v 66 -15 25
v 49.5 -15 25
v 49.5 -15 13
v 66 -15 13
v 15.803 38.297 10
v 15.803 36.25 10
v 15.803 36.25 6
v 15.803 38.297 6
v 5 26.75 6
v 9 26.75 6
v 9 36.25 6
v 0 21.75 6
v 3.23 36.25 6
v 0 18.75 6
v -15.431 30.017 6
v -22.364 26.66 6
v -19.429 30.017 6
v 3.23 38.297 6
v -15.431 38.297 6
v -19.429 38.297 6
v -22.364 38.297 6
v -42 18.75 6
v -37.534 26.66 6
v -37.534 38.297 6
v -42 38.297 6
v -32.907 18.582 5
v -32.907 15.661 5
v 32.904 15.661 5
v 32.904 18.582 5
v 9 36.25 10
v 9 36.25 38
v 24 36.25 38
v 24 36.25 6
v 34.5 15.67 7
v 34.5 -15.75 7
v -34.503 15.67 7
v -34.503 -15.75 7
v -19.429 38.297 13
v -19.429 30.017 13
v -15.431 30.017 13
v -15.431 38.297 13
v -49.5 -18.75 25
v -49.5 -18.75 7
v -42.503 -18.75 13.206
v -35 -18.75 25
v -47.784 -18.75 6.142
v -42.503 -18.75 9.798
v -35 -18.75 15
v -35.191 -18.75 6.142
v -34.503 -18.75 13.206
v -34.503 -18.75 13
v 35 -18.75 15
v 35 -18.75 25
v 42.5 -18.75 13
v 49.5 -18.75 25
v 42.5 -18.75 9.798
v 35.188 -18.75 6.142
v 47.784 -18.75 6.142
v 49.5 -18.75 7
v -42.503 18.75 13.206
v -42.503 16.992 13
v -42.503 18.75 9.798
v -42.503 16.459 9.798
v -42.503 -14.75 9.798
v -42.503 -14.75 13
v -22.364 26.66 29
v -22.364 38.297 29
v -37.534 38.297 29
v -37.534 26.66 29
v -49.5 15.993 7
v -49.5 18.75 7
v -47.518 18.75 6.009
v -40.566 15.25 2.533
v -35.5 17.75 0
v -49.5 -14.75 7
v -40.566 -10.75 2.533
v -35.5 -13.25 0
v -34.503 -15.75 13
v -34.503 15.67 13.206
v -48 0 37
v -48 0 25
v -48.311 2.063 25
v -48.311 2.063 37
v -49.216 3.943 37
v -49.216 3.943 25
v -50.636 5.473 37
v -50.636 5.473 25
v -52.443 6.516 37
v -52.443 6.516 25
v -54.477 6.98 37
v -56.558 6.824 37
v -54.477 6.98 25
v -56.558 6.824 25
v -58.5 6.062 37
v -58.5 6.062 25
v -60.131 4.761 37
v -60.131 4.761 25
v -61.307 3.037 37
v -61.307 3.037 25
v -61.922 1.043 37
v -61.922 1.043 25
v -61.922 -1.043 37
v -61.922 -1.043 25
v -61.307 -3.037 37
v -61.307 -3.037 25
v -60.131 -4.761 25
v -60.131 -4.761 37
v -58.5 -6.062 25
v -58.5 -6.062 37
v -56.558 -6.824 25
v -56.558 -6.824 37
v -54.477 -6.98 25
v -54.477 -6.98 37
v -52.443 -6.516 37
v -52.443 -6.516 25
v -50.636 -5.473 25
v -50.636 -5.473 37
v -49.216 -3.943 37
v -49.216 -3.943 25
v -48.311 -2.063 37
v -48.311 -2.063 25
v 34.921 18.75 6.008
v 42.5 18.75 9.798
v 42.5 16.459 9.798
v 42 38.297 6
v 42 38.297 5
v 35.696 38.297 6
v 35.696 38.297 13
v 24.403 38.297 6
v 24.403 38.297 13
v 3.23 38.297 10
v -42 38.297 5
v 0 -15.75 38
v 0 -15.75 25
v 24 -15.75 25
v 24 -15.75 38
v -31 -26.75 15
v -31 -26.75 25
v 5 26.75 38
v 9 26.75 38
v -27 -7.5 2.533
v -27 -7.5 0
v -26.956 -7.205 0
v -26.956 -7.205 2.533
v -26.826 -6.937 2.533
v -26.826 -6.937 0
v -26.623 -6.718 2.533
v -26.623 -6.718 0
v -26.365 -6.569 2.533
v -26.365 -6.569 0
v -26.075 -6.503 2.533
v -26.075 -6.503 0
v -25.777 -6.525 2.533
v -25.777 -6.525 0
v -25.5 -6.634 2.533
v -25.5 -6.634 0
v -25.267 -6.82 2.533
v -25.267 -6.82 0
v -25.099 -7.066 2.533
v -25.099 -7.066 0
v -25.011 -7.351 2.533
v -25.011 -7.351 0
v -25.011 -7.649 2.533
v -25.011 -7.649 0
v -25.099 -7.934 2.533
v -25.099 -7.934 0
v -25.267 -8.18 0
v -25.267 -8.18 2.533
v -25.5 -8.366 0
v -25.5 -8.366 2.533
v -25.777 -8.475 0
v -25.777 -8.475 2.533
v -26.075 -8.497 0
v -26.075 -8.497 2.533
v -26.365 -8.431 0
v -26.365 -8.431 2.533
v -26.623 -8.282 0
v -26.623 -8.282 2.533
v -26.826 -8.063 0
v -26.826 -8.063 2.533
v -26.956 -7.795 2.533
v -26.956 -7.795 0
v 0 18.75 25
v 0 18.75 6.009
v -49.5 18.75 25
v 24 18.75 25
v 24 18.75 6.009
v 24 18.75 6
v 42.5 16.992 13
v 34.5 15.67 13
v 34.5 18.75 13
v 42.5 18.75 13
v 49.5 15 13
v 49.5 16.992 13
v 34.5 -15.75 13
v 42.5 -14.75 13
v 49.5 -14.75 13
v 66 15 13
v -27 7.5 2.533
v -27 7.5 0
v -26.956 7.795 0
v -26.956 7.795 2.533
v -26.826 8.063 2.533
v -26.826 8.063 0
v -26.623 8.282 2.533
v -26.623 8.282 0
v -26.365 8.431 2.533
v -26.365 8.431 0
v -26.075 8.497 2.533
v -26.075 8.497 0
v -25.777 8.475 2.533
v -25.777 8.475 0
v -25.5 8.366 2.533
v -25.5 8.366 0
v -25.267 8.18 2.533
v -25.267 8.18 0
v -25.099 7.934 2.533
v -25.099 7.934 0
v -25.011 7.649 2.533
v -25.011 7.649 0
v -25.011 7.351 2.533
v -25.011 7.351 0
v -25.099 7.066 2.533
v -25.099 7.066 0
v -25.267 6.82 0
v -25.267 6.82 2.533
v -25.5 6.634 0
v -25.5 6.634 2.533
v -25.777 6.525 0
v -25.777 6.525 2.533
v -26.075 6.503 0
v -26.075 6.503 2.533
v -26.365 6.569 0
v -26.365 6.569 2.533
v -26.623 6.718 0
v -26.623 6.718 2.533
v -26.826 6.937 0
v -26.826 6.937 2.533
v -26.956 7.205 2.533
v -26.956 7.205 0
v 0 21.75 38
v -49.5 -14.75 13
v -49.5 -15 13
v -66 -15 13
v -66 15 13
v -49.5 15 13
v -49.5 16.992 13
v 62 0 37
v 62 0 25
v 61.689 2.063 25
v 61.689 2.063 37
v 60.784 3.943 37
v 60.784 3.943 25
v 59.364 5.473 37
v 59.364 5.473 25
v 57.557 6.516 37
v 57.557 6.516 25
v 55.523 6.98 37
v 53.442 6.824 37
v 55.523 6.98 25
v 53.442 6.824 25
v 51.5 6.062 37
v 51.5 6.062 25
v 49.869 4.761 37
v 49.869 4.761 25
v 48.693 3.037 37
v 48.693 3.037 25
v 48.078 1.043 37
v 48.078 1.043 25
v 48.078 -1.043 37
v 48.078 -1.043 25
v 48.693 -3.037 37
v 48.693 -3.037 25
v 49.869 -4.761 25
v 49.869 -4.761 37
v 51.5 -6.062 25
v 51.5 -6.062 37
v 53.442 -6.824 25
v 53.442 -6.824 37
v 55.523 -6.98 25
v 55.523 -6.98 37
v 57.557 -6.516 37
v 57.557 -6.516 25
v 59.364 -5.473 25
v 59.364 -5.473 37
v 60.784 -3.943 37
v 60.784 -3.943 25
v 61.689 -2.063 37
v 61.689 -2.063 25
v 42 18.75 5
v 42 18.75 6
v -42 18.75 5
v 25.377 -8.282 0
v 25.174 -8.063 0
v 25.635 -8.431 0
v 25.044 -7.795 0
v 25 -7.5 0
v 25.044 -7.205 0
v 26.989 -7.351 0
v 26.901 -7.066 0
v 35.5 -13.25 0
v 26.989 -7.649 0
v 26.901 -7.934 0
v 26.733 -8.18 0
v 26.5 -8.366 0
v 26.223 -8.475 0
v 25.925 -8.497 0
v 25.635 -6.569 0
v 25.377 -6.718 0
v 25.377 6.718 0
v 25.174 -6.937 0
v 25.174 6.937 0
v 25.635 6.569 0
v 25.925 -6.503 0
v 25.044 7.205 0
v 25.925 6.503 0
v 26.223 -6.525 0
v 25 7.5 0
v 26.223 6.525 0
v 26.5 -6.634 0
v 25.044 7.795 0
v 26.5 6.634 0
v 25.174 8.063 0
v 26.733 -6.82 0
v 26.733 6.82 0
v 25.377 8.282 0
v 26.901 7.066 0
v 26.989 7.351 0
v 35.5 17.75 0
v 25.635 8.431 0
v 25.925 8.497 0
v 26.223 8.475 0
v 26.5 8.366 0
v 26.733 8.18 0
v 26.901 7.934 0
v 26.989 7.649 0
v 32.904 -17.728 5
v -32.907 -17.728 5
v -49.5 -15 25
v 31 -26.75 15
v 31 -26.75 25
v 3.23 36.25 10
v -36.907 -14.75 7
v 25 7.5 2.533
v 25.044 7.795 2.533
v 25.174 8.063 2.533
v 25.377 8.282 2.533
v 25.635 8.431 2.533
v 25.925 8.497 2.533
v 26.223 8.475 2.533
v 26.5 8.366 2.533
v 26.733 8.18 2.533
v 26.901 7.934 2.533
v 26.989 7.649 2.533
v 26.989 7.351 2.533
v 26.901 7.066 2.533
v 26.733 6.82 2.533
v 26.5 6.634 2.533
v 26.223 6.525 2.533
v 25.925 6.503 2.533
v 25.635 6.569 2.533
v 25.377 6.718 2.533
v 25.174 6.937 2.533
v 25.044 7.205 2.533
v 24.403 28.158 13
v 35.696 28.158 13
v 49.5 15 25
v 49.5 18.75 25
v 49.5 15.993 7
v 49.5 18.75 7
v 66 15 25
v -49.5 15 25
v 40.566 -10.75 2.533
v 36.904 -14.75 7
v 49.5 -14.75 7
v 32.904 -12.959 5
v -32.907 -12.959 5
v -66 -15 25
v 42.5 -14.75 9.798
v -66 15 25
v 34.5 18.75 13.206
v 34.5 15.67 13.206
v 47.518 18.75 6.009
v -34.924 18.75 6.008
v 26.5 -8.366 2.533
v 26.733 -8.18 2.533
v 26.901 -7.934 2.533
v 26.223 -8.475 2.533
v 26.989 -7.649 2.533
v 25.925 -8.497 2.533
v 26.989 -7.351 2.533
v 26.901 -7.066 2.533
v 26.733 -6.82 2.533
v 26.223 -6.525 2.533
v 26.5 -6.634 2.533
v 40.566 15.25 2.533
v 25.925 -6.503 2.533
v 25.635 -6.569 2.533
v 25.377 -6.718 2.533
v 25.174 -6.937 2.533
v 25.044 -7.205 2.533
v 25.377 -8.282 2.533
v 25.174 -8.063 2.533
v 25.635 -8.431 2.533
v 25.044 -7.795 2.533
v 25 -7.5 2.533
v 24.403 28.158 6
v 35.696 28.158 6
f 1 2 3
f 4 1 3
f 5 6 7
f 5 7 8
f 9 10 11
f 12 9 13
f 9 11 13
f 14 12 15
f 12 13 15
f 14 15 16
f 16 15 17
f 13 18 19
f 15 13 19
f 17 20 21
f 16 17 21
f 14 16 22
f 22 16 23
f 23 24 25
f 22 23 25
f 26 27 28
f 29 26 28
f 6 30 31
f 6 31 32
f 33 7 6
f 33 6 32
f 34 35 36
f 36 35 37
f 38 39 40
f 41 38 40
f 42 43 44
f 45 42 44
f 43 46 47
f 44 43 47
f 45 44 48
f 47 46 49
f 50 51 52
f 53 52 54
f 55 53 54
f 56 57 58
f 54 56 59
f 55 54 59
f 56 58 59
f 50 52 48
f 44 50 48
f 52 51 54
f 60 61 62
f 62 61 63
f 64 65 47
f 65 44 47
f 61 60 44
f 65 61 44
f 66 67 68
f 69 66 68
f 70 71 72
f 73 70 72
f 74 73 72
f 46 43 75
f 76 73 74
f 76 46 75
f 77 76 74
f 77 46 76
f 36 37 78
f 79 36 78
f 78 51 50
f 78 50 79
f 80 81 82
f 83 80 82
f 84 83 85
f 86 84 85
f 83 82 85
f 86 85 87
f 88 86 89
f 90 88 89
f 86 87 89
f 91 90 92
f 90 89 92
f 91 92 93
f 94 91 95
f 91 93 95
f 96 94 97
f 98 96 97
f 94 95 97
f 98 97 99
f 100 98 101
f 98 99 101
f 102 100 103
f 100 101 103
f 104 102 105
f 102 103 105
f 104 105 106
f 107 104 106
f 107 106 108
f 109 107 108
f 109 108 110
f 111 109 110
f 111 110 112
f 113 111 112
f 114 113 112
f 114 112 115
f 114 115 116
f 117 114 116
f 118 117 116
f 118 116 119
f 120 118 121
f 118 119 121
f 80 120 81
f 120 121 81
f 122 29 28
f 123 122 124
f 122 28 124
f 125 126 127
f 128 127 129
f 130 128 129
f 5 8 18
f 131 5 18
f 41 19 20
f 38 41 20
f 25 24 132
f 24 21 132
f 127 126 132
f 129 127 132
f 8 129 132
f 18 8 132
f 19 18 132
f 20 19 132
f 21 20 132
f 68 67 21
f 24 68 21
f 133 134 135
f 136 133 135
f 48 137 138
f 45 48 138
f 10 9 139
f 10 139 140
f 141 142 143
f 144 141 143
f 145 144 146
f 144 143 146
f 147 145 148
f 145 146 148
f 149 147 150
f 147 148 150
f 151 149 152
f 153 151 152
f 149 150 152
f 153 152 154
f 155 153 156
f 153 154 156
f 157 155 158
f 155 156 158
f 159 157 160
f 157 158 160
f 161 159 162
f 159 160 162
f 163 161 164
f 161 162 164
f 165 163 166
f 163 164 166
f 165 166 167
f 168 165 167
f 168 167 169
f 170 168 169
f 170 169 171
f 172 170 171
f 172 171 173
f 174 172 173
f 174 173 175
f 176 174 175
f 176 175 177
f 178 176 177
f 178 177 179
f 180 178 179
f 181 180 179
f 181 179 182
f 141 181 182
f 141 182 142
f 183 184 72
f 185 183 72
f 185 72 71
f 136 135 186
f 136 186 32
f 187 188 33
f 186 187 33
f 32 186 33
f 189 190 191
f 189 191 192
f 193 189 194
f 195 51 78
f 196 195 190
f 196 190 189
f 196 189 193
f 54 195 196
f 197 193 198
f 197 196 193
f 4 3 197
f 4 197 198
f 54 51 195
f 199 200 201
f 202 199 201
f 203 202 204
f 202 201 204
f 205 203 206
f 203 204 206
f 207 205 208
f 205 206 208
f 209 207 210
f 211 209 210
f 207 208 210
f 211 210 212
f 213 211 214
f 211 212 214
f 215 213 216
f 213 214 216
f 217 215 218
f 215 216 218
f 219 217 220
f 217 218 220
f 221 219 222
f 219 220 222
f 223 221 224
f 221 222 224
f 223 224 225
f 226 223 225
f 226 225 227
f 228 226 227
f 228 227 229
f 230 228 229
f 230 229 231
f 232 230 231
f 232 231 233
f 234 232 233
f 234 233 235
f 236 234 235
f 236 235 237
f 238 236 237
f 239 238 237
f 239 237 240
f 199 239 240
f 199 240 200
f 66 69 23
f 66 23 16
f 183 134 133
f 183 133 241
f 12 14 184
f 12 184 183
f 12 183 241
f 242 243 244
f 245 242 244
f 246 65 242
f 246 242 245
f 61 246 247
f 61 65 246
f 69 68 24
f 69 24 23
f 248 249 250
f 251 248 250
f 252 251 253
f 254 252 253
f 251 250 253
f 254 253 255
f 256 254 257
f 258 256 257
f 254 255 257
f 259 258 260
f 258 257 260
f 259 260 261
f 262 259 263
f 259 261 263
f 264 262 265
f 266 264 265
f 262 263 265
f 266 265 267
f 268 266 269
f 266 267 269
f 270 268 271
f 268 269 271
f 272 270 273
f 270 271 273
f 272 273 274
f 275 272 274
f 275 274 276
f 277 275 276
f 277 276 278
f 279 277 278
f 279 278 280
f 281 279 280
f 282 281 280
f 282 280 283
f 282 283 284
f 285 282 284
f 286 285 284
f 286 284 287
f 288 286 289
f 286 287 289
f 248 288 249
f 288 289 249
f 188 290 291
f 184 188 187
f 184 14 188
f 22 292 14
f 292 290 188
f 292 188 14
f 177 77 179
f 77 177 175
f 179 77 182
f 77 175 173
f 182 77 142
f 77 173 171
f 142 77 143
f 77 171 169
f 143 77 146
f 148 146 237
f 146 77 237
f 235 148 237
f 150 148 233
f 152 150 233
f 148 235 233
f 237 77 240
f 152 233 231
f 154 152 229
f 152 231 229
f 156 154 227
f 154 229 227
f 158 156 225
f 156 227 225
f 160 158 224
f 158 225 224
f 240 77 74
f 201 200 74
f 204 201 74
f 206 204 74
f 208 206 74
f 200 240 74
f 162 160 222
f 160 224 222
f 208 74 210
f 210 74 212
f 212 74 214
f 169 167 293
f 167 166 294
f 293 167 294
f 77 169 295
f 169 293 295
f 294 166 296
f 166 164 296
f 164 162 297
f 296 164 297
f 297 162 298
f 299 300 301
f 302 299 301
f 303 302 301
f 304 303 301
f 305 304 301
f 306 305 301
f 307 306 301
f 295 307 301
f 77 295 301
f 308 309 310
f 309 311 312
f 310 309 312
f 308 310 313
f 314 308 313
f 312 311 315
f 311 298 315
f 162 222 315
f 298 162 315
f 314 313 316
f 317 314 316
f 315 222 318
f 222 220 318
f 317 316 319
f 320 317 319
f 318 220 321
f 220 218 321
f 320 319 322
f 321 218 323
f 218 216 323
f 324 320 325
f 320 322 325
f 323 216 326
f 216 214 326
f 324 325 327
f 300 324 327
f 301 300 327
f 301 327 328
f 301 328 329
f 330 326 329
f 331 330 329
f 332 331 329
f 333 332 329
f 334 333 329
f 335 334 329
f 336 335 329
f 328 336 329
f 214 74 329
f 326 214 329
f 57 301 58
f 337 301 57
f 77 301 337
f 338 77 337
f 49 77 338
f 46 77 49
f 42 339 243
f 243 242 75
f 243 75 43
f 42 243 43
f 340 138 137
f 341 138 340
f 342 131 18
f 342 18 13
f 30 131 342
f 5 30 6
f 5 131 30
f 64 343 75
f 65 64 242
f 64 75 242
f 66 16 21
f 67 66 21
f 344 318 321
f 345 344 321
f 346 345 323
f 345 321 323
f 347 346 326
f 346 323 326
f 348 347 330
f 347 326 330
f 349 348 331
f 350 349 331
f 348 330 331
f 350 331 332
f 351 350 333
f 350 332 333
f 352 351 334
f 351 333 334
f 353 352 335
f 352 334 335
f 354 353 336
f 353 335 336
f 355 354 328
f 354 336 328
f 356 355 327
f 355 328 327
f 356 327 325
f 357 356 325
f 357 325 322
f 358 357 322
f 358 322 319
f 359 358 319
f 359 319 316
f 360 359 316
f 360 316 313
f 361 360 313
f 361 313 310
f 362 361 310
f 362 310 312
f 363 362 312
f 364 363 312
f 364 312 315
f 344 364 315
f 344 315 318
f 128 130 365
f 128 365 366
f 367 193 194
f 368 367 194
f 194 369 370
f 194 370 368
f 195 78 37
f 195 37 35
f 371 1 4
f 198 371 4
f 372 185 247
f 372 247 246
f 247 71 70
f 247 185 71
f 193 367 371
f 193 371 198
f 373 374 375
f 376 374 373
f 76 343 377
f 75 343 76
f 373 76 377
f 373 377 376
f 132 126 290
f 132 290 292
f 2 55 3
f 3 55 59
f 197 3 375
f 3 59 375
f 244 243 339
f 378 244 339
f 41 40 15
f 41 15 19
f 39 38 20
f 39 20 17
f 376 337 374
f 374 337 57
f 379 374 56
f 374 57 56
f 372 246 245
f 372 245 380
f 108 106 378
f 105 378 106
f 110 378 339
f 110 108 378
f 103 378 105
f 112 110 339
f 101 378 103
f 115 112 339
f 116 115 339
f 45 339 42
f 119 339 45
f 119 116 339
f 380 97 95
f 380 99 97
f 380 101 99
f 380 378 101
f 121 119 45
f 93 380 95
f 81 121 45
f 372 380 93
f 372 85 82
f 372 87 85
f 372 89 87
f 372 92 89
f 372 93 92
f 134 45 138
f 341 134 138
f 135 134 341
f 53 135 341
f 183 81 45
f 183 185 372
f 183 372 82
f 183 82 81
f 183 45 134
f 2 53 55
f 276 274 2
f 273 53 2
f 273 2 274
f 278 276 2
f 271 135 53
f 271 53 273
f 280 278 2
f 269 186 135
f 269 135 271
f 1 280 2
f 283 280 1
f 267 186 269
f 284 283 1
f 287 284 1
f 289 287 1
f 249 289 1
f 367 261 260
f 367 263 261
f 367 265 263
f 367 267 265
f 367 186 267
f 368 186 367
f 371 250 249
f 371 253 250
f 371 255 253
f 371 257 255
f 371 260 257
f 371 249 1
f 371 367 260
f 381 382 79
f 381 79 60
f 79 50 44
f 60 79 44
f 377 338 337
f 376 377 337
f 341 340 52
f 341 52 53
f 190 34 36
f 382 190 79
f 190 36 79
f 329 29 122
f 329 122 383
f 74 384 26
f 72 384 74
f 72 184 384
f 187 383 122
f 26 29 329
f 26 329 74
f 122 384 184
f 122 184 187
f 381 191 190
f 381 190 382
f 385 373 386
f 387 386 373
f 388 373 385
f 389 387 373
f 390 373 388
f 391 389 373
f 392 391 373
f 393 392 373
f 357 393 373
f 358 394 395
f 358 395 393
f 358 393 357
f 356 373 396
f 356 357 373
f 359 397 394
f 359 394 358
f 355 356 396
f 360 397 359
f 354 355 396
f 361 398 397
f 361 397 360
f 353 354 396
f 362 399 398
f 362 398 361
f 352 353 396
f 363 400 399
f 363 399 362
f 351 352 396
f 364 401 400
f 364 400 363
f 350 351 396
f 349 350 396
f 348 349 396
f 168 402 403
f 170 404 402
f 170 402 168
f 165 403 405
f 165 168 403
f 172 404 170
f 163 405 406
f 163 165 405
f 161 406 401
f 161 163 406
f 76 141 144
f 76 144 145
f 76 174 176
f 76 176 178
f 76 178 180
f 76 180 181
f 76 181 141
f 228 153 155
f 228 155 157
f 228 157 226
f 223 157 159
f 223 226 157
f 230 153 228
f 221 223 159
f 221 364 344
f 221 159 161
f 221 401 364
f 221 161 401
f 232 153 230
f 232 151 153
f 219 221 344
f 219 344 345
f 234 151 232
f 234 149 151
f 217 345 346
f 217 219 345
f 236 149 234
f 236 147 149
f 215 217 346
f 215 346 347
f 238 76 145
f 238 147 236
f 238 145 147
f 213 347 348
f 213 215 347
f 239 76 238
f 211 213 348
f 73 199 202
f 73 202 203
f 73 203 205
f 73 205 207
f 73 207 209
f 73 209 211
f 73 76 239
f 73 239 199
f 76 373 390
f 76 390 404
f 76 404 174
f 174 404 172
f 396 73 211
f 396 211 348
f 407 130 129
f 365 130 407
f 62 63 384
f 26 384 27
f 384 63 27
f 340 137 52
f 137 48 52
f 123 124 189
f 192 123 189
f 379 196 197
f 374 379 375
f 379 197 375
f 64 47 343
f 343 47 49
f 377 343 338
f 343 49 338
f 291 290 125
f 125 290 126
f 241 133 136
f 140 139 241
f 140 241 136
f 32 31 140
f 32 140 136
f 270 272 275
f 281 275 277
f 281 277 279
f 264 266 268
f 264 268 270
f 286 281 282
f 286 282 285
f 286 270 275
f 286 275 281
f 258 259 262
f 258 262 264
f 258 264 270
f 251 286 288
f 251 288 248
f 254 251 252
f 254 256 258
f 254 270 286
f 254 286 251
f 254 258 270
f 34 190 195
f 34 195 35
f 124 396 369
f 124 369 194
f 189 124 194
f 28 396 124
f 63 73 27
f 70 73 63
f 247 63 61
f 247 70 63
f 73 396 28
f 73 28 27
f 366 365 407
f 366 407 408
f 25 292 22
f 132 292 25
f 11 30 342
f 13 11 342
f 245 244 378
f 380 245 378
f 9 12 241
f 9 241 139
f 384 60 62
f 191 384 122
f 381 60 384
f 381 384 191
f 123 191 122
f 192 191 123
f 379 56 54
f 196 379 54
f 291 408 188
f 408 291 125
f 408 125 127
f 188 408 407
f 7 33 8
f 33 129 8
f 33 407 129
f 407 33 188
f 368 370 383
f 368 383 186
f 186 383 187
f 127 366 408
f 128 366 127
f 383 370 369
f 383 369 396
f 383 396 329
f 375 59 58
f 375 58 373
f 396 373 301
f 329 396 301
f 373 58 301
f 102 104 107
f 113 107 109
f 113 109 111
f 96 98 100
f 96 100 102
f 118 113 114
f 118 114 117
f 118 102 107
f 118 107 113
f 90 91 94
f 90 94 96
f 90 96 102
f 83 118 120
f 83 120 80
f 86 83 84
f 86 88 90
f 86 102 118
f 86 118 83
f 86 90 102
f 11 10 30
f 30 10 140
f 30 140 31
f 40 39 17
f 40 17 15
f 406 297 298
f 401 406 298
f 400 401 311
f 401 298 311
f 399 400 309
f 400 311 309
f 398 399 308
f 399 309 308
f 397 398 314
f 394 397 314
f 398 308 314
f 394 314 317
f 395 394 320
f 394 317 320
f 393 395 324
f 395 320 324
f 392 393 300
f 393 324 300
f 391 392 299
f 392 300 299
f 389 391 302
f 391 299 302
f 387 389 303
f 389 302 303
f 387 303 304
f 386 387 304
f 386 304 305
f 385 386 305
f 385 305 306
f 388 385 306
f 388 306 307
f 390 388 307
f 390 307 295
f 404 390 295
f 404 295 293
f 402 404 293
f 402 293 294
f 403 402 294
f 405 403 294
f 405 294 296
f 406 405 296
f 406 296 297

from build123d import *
from OCP.BRepFilletAPI import BRepFilletAPI_MakeChamfer

# Parameters (mm, degrees)
BOSS_EXTRUDE1_DEPTH = 25
SKETCH2_W           = 84
SKETCH2_H           = 19.546511152
BOSS_EXTRUDE2_DEPTH = 24
SKETCH3_W           = 12
SKETCH3_H           = 30
BOSS_EXTRUDE3_DEPTH = 16.5
SKETCH4_W           = 12
SKETCH4_H           = 30
BOSS_EXTRUDE4_DEPTH = 16.5
SKETCH5_W           = 24
SKETCH5_H           = 52
BOSS_EXTRUDE5_DEPTH = 13
SKETCH9_W           = 70
SKETCH9_H           = 10
BOSS_EXTRUDE6_DEPTH = 8
CHAMFER1_SIZE       = 8
CHAMFER1_SIZE_2     = 4
SKETCH10_R          = 7
BOSS_EXTRUDE7_DEPTH = 12
SKETCH11_R          = 1
CUT_EXTRUDE1_DEPTH  = 5
CUT_EXTRUDE24_DEPTH = 37.4999
CUT_EXTRUDE25_REACH = 90.714
CUT_EXTRUDE26_DEPTH = 99
CUT_EXTRUDE27_REACH = 129.479
CUT_EXTRUDE28_DEPTH = 69.00303493
CUT_EXTRUDE29_REACH = 129.479
SKETCH19_W          = 69.00303493
SKETCH19_H          = 6
CUT_EXTRUDE30_DEPTH = 3
CUT_EXTRUDE32_DEPTH = 23
SKETCH21_W          = 3.997604332
SKETCH21_H          = 8.279085248
SKETCH21_W_2        = 11.293242608
SKETCH21_H_2        = 10.138766403
CUT_EXTRUDE33_DEPTH = 16
SKETCH22_W          = 12.573143588
SKETCH22_H          = 2.046511152
CUT_EXTRUDE34_DEPTH = 19
CUT_EXTRUDE35_DEPTH = 32


with BuildPart() as part:
    # Sketch1 → Boss-Extrude1 (new body)
    with BuildSketch(Plane.XY):
        Polygon((49.5, 0), (49.5, 18.75), (-49.5, 18.75), (-49.5, -18.75), (49.5, -18.75), align=None)
    extrude(amount=BOSS_EXTRUDE1_DEPTH)

    # Sketch2 → Boss-Extrude2 (add)
    with BuildSketch(Plane(origin=(0, 0, 5), x_dir=(-1, 0, 0), z_dir=(0, 0, -1))):
        with Locations((0, 28.523255576)):
            Rectangle(SKETCH2_W, SKETCH2_H)
    extrude(amount=-BOSS_EXTRUDE2_DEPTH)

    # Sketch3 → Boss-Extrude3 (add)
    with BuildSketch(Plane(origin=(49.5, 0, 0), x_dir=(0, 0, -1), z_dir=(1, 0, 0))):
        with Locations((-19, 0)):
            Rectangle(SKETCH3_W, SKETCH3_H)
    extrude(amount=BOSS_EXTRUDE3_DEPTH)

    # Sketch4 → Boss-Extrude4 (add)
    with BuildSketch(Plane.ZY.offset(49.5)):
        with Locations((19, 0)):
            Rectangle(SKETCH4_W, SKETCH4_H)
    extrude(amount=BOSS_EXTRUDE4_DEPTH)

    # Sketch5 → Boss-Extrude5 (add)
    with BuildSketch(Plane.XY.offset(25)):
        with Locations((12, 10.25)):
            Rectangle(SKETCH5_W, SKETCH5_H)
    extrude(amount=BOSS_EXTRUDE5_DEPTH)

    # Sketch9 → Boss-Extrude6 (add)
    with BuildSketch(Plane.XZ.offset(18.75)):
        with Locations((0, 20)):
            Rectangle(SKETCH9_W, SKETCH9_H)
    extrude(amount=BOSS_EXTRUDE6_DEPTH)

    # Chamfer1
    chamfer1_edges_1 = [part.edges().sort_by_distance(p)[0] for p in [
        (-35, -26.75, 20),
    ]]
    chamfer1_side_1 = [part.faces().sort_by_distance(p)[0] for p in [
        (-35, -26.67, 20),
    ]]
    chamfer1_edges_2 = [part.edges().sort_by_distance(p)[0] for p in [
        (35, -26.75, 20),
    ]]
    chamfer1_side_2 = [part.faces().sort_by_distance(p)[0] for p in [
        (35, -26.67, 20),
    ]]
    chamfer1 = BRepFilletAPI_MakeChamfer(part.part.solid().wrapped)
    for e in chamfer1_edges_1:
        chamfer1.Add(CHAMFER1_SIZE - 0.0001, CHAMFER1_SIZE_2 - 0.0001, e.wrapped, chamfer1_side_1[0].wrapped)
    for e in chamfer1_edges_2:
        chamfer1.Add(CHAMFER1_SIZE - 0.0001, CHAMFER1_SIZE_2 - 0.0001, e.wrapped, chamfer1_side_2[0].wrapped)
    add(Compound.cast(chamfer1.Shape()), mode=Mode.REPLACE)  # a hair under: the kernel refuses the full size

    # Sketch10 → Boss-Extrude7 (add)
    with BuildSketch(Plane.XY.offset(25)):
        with Locations((-55, 0)):
            Circle(SKETCH10_R)
        with Locations((55, 0)):
            Circle(SKETCH10_R)
    extrude(amount=BOSS_EXTRUDE7_DEPTH)

    # Sketch11 → Cut-Extrude1 (cut)
    with BuildSketch(Plane(origin=(0, 0, 0), x_dir=(-1, 0, 0), z_dir=(0, 0, -1))):
        with Locations((-26, 7.5)):
            Circle(SKETCH11_R)
        with Locations((26, 7.5)):
            Circle(SKETCH11_R)
        with Locations((26, -7.5)):
            Circle(SKETCH11_R)
        with Locations((-26, -7.5)):
            Circle(SKETCH11_R)
    extrude(amount=-CUT_EXTRUDE1_DEPTH, mode=Mode.SUBTRACT)

    # Sketch12 → Cut-Extrude24 (cut)
    with BuildSketch(Plane.XZ.offset(18.75)):
        Polygon((49.5, 7), (35.5, 0), (49.5, 0), align=None)
        Polygon((-49.5, 0), (-49.5, 7), (-35.5, 0), align=None)
        Polygon((-42.50303493, 13.206106321), (-42.50303493, 9.79786642), (-32.90730209, 5), (32.904267164, 5), (42.5, 9.797866418), (42.5, 13), (34.5, 13), (34.5, 7), (-34.50303493, 7), (-34.50303493, 13.206106321), align=None)
    extrude(amount=-CUT_EXTRUDE24_DEPTH, mode=Mode.SUBTRACT)

    # Sketch13 → Cut-Extrude25 (cut, up to next)
    with BuildSketch(Plane.XZ.offset(-18.7499), mode=Mode.PRIVATE) as cut_extrude25_sk1:
        Polygon((49.5, 7), (49.5, 0), (35.5, 0), align=None)
    cut_extrude25_tool1 = extrude(cut_extrude25_sk1.sketch, amount=-CUT_EXTRUDE25_REACH, mode=Mode.PRIVATE) & part.part
    # Sketch13 → Cut-Extrude25 (cut, up to next)
    with BuildSketch(Plane.XZ.offset(-18.7499), mode=Mode.PRIVATE) as cut_extrude25_sk2:
        Polygon((-35.5, 0), (-49.5, 0), (-49.5, 7), align=None)
    cut_extrude25_tool2 = extrude(cut_extrude25_sk2.sketch, amount=-CUT_EXTRUDE25_REACH, mode=Mode.PRIVATE) & part.part
    add(cut_extrude25_tool1.solids().sort_by_distance((44.833333, 18.7499, 2.333333))[0], mode=Mode.SUBTRACT)
    add(cut_extrude25_tool2.solids().sort_by_distance((-44.833333, 18.7499, 2.333333))[0], mode=Mode.SUBTRACT)

    # Sketch14 → Cut-Extrude26 (cut)
    with BuildSketch(Plane.ZY.offset(49.5)):
        Polygon((13, 15.669938024), (7, 15.669938024), (7, -14.75), (2.533243234, -10.75), (2.533243234, 15.25), (13, 16.991870924), align=None)
        Polygon((0, 17.75), (0, 18.75), (6.008916401, 18.75), align=None)
        Polygon((0, -13.25), (6.141790553, -18.75), (0, -18.75), align=None)
    extrude(amount=-CUT_EXTRUDE26_DEPTH, mode=Mode.SUBTRACT)

    # Sketch15 → Cut-Extrude27 (cut, up to next)
    with BuildSketch(Plane.ZY.offset(49.5), mode=Mode.PRIVATE) as cut_extrude27_sk1:
        Polygon((7, -14.75), (13, -14.75), (13, 15), (13, 15.669938024), (7, 15.669938024), align=None)
    cut_extrude27_tool1 = extrude(cut_extrude27_sk1.sketch, amount=-CUT_EXTRUDE27_REACH, mode=Mode.PRIVATE) & part.part
    add(cut_extrude27_tool1.solids().sort_by_distance((-49.5, 0.459969, 10))[0], mode=Mode.SUBTRACT)

    # Sketch16 → Cut-Extrude28 (cut)
    with BuildSketch(Plane.ZY.offset(34.50303493)):
        Polygon((13, 15.669938024), (13.206106321, 15.669938024), (13.206106321, 18.7499), (7, 18.7499), (7, 15.993354786), (13, 16.991870924), align=None)
    extrude(amount=-CUT_EXTRUDE28_DEPTH, mode=Mode.SUBTRACT)

    # Sketch18 → Cut-Extrude29 (cut, up to next)
    with BuildSketch(Plane(origin=(49.5, 0, 0), x_dir=(0, 0, -1), z_dir=(1, 0, 0)), mode=Mode.PRIVATE) as cut_extrude29_sk1:
        Polygon((-13, 15.669938024), (-13, 15), (-13, -14.75), (-7, -14.75), (-7, 15.669938024), align=None)
    cut_extrude29_tool1 = extrude(cut_extrude29_sk1.sketch, amount=-CUT_EXTRUDE29_REACH, mode=Mode.PRIVATE) & part.part
    add(cut_extrude29_tool1.solids().sort_by_distance((49.5, 0.459969, 10))[0], mode=Mode.SUBTRACT)

    # Sketch19 → Cut-Extrude30 (cut)
    with BuildSketch(Plane.XZ.offset(18.75)):
        with Locations((-0.001517465, 10)):
            Rectangle(SKETCH19_W, SKETCH19_H)
    extrude(amount=-CUT_EXTRUDE30_DEPTH, mode=Mode.SUBTRACT)

    # Sketch20 → Cut-Extrude32 (cut)
    with BuildSketch(Plane.XY.offset(29)):
        Polygon((3.229837256, 36.25), (0, 36.25), (0, 18.75), (-42, 18.75), (-42, 38.296511152), (-37.533682083, 38.296511152), (-37.533682083, 26.659686261), (-22.363703257, 26.659686261), (-22.363703257, 38.296511152), (-19.429087816, 38.296511152), (-19.429087816, 30.017425904), (-15.431483484, 30.017425904), (-15.431483484, 38.296511152), (3.229837256, 38.296511152), align=None)
        Polygon((24.40253089, 38.296511152), (24.40253089, 28.157744749), (35.695773498, 28.157744749), (35.695773498, 38.296511152), (42, 38.296511152), (42, 18.75), (24, 18.75), (24, 36.25), (15.802980844, 36.25), (15.802980844, 38.296511152), align=None)
    extrude(amount=-CUT_EXTRUDE32_DEPTH, mode=Mode.SUBTRACT)

    # Sketch21 → Cut-Extrude33 (cut)
    with BuildSketch(Plane.XY.offset(29)):
        with Locations((-17.43028565, 34.156968528)):
            Rectangle(SKETCH21_W, SKETCH21_H)
        with Locations((30.049152194, 33.227127951)):
            Rectangle(SKETCH21_W_2, SKETCH21_H_2)
    extrude(amount=-CUT_EXTRUDE33_DEPTH, mode=Mode.SUBTRACT)

    # Sketch22 → Cut-Extrude34 (cut)
    with BuildSketch(Plane.XY.offset(29)):
        with Locations((9.51640905, 37.273255576)):
            Rectangle(SKETCH22_W, SKETCH22_H)
    extrude(amount=-CUT_EXTRUDE34_DEPTH, mode=Mode.SUBTRACT)

    # Sketch23 → Cut-Extrude35 (cut)
    with BuildSketch(Plane.XY.offset(38)):
        Polygon((0, 21.75), (5, 26.75), (9, 26.75), (9, 36.25), (0, 36.25), align=None)
    extrude(amount=-CUT_EXTRUDE35_DEPTH, mode=Mode.SUBTRACT)


solid = part.part
